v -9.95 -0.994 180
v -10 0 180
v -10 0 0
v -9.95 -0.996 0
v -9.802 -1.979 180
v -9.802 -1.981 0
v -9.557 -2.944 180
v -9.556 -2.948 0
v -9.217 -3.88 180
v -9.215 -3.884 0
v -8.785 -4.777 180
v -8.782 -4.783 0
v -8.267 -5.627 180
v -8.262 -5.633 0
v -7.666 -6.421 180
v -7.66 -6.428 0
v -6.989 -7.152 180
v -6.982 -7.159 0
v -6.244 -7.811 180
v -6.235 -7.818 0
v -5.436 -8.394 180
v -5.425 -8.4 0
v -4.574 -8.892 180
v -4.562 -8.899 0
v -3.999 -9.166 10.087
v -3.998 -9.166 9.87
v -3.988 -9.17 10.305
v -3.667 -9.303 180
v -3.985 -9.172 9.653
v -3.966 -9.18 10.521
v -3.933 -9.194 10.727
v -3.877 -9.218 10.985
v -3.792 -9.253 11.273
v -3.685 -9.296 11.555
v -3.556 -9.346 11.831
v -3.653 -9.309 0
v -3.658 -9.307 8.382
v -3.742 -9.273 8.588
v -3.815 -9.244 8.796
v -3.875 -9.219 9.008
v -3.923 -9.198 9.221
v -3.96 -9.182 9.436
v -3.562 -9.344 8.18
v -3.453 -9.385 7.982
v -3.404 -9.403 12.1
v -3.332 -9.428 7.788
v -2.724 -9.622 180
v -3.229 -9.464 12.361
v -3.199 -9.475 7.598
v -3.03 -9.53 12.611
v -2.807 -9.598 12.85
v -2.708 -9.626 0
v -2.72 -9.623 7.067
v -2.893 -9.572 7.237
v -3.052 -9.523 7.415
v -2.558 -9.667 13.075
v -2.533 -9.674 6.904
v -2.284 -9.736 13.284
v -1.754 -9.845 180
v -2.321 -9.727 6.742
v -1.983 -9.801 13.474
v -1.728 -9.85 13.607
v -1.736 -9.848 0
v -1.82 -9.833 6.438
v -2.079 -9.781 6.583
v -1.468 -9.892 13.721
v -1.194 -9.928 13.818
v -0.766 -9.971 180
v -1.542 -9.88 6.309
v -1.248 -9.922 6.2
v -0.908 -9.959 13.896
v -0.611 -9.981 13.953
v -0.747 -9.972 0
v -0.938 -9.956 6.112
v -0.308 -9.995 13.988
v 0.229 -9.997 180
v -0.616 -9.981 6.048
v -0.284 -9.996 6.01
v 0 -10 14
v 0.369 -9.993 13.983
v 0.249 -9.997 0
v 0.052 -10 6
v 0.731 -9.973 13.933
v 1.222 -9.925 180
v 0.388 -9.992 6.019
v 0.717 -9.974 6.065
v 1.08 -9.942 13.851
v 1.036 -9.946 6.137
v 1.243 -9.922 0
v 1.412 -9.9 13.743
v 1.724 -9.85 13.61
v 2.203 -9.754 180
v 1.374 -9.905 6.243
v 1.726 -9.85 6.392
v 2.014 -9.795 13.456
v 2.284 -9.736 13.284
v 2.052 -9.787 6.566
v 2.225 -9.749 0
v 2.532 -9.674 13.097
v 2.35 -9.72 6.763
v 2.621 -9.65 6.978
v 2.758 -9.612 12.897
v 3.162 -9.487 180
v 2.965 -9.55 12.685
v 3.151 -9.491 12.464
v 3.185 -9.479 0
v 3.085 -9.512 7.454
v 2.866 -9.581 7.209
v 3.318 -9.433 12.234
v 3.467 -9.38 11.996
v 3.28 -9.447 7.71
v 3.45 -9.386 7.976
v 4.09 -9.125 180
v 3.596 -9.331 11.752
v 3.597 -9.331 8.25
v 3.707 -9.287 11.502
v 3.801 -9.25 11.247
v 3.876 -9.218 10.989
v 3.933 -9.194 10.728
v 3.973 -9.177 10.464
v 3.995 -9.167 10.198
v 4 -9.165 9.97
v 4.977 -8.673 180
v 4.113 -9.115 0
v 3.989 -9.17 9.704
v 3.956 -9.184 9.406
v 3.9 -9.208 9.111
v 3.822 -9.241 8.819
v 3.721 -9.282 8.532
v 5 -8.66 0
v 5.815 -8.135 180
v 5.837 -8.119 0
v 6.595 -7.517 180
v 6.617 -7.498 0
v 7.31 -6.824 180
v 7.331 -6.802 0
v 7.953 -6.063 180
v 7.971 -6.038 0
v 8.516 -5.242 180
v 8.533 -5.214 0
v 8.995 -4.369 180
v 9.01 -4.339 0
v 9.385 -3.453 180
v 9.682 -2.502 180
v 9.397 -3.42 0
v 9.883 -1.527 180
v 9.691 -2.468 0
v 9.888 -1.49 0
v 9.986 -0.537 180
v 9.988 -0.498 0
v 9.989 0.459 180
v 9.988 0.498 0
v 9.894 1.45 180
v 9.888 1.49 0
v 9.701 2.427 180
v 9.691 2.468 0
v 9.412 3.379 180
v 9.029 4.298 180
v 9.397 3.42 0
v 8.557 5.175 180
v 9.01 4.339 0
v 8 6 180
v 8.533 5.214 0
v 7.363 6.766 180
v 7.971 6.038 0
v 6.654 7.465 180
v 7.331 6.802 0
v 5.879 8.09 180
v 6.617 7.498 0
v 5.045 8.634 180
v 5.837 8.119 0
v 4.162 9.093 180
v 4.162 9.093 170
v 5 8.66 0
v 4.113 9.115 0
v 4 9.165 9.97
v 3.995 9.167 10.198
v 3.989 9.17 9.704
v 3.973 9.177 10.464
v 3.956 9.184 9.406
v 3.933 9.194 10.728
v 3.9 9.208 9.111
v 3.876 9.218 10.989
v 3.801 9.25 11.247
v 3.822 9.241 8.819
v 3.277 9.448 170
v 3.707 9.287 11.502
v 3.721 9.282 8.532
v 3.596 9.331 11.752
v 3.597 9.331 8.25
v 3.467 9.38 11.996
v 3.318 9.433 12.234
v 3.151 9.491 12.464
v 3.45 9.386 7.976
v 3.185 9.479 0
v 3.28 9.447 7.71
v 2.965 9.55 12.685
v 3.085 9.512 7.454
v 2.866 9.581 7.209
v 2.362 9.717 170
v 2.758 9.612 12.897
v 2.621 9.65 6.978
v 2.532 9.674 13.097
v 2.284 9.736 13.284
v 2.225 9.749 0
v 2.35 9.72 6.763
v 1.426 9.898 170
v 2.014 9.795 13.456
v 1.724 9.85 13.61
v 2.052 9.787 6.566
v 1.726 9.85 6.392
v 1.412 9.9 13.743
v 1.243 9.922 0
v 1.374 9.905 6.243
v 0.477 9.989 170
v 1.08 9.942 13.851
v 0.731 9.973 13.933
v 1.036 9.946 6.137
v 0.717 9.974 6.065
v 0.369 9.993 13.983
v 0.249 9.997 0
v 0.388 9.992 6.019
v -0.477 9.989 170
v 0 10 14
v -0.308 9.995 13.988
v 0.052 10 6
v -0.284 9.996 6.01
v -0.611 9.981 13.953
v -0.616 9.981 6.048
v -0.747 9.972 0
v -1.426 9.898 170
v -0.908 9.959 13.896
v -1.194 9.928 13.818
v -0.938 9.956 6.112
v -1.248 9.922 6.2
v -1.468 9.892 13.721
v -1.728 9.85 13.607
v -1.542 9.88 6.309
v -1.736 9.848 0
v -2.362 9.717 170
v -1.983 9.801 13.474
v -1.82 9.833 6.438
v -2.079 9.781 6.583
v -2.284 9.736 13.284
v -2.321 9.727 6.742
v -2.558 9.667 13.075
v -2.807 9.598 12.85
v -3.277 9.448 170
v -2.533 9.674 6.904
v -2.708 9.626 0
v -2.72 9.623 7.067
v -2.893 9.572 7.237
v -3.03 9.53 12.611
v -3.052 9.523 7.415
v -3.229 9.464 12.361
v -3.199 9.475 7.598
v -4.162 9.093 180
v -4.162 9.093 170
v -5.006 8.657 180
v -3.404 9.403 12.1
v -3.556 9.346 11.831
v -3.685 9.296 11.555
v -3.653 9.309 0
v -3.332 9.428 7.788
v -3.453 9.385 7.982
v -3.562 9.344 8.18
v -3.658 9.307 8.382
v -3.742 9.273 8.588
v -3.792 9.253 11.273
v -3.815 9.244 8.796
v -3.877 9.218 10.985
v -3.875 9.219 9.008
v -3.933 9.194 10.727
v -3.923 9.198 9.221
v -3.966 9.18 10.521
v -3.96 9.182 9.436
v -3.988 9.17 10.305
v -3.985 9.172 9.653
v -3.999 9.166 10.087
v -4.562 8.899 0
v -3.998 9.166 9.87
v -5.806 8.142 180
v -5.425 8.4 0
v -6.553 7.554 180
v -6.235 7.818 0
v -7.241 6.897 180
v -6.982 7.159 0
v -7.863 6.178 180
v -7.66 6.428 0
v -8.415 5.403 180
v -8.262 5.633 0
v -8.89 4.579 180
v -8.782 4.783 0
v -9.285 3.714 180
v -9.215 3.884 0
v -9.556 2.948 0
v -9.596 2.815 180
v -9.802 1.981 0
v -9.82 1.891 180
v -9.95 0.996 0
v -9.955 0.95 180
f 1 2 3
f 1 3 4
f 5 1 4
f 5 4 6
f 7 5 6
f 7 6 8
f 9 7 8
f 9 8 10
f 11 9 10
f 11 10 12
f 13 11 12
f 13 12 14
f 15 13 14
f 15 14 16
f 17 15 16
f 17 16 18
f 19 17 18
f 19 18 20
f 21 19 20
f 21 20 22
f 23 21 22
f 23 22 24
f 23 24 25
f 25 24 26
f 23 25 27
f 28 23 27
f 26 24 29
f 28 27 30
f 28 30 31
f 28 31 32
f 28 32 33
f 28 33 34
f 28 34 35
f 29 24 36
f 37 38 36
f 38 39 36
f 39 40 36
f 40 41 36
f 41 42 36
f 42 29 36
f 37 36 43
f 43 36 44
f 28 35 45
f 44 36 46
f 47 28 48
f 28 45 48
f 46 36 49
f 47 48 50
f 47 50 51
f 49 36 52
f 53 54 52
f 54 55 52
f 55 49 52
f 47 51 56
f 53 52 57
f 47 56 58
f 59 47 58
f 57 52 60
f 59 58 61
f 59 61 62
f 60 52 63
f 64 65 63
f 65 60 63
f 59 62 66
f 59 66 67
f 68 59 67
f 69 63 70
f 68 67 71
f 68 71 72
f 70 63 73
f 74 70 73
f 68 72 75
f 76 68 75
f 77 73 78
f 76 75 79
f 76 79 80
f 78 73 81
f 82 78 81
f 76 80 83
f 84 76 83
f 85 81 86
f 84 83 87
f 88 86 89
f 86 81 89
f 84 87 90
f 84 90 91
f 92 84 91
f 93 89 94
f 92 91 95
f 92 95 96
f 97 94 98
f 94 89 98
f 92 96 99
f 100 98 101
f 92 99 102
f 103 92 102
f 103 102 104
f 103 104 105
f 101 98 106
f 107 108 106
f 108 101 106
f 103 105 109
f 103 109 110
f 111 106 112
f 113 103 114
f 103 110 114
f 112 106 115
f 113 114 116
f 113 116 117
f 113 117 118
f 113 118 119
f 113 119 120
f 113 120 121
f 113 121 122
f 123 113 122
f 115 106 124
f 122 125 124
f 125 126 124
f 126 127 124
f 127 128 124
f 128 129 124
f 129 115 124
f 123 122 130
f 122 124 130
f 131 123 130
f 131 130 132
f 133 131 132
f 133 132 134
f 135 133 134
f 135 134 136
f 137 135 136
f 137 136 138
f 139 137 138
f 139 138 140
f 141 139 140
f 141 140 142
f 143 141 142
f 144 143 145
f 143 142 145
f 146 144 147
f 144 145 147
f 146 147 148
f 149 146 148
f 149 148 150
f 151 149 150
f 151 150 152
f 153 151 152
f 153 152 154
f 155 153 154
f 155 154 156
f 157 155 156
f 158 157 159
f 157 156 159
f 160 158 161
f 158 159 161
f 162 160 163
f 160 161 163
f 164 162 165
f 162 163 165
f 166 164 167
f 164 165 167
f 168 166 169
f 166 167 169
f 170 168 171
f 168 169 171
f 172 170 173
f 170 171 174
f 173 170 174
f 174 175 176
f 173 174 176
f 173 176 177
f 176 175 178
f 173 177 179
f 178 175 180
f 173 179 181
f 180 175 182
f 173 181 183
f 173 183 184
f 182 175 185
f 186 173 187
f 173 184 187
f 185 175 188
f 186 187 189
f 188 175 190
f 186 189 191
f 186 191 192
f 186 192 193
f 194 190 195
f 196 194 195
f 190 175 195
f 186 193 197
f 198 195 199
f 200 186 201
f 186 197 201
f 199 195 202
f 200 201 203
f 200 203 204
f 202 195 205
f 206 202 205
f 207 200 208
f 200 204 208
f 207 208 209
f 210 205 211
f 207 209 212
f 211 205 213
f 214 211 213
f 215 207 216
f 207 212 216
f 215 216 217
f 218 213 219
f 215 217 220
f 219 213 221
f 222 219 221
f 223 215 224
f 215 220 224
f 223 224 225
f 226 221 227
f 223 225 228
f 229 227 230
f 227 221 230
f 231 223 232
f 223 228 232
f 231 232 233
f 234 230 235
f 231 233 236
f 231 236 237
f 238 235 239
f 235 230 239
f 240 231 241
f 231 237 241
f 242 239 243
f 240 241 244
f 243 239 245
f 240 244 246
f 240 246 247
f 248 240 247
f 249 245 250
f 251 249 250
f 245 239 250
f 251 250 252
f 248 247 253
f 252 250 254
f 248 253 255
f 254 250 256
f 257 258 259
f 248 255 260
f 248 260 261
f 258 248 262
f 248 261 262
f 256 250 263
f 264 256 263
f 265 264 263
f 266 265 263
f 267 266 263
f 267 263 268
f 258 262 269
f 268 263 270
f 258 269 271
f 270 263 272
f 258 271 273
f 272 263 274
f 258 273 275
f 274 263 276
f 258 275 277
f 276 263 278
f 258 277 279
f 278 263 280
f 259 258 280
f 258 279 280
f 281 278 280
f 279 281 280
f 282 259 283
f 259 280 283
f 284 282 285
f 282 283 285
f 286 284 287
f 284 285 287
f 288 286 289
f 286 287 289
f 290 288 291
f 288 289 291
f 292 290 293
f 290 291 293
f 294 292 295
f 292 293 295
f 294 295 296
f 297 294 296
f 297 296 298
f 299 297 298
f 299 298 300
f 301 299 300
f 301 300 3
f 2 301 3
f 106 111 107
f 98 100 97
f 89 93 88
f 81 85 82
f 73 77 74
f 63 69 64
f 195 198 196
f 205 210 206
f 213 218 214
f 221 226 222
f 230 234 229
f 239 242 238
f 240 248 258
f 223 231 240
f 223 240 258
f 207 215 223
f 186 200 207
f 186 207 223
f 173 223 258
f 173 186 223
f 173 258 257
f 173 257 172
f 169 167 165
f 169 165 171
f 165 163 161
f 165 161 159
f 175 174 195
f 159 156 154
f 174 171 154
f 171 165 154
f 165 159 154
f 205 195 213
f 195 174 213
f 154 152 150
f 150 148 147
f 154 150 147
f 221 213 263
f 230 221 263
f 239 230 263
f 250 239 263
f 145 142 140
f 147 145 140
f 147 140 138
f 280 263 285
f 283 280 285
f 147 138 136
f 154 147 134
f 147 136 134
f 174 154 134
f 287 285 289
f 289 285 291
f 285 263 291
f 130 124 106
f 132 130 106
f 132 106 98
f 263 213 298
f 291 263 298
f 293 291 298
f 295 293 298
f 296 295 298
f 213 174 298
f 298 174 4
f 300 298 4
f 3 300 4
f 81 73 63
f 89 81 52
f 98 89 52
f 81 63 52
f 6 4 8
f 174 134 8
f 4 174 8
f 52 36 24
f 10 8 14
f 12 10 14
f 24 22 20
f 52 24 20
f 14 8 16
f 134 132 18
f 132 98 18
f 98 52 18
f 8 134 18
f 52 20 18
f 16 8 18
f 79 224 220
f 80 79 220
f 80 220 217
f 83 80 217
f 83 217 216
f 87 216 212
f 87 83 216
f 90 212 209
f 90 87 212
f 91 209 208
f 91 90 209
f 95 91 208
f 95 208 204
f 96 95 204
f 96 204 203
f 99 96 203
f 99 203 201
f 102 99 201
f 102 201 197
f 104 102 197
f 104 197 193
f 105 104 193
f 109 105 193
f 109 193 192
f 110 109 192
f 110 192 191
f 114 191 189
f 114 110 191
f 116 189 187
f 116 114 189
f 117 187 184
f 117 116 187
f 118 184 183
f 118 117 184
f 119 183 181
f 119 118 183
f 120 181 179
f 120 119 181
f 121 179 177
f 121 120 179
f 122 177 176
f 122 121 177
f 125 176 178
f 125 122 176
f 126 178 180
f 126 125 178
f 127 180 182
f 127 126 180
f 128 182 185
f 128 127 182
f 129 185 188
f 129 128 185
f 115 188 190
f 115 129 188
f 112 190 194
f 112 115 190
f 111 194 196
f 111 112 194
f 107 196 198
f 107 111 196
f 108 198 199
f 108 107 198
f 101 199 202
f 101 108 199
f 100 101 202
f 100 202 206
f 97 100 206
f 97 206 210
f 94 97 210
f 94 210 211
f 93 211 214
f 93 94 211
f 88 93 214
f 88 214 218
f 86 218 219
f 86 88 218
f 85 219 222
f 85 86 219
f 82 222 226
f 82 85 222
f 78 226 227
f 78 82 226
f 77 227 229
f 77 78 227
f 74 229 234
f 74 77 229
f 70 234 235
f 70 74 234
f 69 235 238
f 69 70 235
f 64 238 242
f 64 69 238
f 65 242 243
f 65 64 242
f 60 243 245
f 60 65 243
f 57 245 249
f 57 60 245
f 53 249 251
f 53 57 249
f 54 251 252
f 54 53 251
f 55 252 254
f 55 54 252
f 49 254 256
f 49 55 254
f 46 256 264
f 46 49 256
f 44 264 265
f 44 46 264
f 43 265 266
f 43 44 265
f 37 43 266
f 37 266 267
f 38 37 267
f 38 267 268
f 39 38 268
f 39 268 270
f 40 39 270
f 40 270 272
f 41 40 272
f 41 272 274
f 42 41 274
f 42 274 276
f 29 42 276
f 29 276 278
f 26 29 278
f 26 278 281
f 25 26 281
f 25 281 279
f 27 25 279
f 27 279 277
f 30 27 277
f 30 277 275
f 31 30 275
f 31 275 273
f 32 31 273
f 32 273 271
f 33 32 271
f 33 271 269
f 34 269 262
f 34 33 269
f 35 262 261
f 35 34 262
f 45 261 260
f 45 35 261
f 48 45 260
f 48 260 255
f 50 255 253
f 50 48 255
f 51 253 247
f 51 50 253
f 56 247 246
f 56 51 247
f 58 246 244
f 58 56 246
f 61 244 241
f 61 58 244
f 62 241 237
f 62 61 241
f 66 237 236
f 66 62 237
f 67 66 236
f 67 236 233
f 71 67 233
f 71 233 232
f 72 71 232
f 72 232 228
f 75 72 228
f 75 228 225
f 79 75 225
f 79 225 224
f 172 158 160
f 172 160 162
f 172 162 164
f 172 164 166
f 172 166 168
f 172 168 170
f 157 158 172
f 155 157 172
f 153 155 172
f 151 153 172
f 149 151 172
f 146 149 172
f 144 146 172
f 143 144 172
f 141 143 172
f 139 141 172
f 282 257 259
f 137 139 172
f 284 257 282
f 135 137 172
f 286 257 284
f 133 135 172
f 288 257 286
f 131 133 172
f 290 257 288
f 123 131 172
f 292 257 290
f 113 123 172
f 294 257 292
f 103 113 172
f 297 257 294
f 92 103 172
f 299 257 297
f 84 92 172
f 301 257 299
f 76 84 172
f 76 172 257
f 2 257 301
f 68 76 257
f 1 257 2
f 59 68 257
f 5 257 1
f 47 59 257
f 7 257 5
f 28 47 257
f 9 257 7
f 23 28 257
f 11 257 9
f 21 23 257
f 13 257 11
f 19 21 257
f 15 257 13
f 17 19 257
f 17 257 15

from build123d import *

# Parameters (mm, degrees)
SKETCH1_R               = 10
BOSS_EXTRUDE1_DEPTH     = 180
CUT_EXTRUDE1_DEPTH      = 181.554700853
CUT_EXTRUDE1_DEPTH_BACK = 181.554700853
SKETCH2_R               = 4
CUT_EXTRUDE2_START      = -10
CUT_EXTRUDE2_DEPTH      = 10


with BuildPart() as part:
    # Sketch1 → Boss-Extrude1 (new body)
    with BuildSketch(Plane.XY):
        with Locations(Location((0, 0, 0), (0, 0, 180))):
            Circle(SKETCH1_R)
    extrude(amount=BOSS_EXTRUDE1_DEPTH)

    # Sketch2 → Cut-Extrude1 (cut, two sides: drawn at the far end of the back side and taken through both)
    with BuildSketch(Plane(origin=(0, 0, 0), x_dir=(1, 0, 0), z_dir=(0, 1, 0)).offset(-CUT_EXTRUDE1_DEPTH_BACK)):
        with Locations(Location((0, -10, 0), (0, 0, 270))):
            Circle(SKETCH2_R)
    extrude(amount=CUT_EXTRUDE1_DEPTH + CUT_EXTRUDE1_DEPTH_BACK, mode=Mode.SUBTRACT)

    # Sketch3 → Cut-Extrude2 (cut)
    with BuildSketch(Plane.XY.offset(180).offset(CUT_EXTRUDE2_START)):
        with BuildLine():
            Line((-4.161531139, 9.092945539), (4.161531139, 9.092945539))
            ThreePointArc((4.161531139, 9.092945539), (0, 10), (-4.161531139, 9.092945539))
        make_face()
    extrude(amount=CUT_EXTRUDE2_DEPTH, mode=Mode.SUBTRACT)


solid = part.part
